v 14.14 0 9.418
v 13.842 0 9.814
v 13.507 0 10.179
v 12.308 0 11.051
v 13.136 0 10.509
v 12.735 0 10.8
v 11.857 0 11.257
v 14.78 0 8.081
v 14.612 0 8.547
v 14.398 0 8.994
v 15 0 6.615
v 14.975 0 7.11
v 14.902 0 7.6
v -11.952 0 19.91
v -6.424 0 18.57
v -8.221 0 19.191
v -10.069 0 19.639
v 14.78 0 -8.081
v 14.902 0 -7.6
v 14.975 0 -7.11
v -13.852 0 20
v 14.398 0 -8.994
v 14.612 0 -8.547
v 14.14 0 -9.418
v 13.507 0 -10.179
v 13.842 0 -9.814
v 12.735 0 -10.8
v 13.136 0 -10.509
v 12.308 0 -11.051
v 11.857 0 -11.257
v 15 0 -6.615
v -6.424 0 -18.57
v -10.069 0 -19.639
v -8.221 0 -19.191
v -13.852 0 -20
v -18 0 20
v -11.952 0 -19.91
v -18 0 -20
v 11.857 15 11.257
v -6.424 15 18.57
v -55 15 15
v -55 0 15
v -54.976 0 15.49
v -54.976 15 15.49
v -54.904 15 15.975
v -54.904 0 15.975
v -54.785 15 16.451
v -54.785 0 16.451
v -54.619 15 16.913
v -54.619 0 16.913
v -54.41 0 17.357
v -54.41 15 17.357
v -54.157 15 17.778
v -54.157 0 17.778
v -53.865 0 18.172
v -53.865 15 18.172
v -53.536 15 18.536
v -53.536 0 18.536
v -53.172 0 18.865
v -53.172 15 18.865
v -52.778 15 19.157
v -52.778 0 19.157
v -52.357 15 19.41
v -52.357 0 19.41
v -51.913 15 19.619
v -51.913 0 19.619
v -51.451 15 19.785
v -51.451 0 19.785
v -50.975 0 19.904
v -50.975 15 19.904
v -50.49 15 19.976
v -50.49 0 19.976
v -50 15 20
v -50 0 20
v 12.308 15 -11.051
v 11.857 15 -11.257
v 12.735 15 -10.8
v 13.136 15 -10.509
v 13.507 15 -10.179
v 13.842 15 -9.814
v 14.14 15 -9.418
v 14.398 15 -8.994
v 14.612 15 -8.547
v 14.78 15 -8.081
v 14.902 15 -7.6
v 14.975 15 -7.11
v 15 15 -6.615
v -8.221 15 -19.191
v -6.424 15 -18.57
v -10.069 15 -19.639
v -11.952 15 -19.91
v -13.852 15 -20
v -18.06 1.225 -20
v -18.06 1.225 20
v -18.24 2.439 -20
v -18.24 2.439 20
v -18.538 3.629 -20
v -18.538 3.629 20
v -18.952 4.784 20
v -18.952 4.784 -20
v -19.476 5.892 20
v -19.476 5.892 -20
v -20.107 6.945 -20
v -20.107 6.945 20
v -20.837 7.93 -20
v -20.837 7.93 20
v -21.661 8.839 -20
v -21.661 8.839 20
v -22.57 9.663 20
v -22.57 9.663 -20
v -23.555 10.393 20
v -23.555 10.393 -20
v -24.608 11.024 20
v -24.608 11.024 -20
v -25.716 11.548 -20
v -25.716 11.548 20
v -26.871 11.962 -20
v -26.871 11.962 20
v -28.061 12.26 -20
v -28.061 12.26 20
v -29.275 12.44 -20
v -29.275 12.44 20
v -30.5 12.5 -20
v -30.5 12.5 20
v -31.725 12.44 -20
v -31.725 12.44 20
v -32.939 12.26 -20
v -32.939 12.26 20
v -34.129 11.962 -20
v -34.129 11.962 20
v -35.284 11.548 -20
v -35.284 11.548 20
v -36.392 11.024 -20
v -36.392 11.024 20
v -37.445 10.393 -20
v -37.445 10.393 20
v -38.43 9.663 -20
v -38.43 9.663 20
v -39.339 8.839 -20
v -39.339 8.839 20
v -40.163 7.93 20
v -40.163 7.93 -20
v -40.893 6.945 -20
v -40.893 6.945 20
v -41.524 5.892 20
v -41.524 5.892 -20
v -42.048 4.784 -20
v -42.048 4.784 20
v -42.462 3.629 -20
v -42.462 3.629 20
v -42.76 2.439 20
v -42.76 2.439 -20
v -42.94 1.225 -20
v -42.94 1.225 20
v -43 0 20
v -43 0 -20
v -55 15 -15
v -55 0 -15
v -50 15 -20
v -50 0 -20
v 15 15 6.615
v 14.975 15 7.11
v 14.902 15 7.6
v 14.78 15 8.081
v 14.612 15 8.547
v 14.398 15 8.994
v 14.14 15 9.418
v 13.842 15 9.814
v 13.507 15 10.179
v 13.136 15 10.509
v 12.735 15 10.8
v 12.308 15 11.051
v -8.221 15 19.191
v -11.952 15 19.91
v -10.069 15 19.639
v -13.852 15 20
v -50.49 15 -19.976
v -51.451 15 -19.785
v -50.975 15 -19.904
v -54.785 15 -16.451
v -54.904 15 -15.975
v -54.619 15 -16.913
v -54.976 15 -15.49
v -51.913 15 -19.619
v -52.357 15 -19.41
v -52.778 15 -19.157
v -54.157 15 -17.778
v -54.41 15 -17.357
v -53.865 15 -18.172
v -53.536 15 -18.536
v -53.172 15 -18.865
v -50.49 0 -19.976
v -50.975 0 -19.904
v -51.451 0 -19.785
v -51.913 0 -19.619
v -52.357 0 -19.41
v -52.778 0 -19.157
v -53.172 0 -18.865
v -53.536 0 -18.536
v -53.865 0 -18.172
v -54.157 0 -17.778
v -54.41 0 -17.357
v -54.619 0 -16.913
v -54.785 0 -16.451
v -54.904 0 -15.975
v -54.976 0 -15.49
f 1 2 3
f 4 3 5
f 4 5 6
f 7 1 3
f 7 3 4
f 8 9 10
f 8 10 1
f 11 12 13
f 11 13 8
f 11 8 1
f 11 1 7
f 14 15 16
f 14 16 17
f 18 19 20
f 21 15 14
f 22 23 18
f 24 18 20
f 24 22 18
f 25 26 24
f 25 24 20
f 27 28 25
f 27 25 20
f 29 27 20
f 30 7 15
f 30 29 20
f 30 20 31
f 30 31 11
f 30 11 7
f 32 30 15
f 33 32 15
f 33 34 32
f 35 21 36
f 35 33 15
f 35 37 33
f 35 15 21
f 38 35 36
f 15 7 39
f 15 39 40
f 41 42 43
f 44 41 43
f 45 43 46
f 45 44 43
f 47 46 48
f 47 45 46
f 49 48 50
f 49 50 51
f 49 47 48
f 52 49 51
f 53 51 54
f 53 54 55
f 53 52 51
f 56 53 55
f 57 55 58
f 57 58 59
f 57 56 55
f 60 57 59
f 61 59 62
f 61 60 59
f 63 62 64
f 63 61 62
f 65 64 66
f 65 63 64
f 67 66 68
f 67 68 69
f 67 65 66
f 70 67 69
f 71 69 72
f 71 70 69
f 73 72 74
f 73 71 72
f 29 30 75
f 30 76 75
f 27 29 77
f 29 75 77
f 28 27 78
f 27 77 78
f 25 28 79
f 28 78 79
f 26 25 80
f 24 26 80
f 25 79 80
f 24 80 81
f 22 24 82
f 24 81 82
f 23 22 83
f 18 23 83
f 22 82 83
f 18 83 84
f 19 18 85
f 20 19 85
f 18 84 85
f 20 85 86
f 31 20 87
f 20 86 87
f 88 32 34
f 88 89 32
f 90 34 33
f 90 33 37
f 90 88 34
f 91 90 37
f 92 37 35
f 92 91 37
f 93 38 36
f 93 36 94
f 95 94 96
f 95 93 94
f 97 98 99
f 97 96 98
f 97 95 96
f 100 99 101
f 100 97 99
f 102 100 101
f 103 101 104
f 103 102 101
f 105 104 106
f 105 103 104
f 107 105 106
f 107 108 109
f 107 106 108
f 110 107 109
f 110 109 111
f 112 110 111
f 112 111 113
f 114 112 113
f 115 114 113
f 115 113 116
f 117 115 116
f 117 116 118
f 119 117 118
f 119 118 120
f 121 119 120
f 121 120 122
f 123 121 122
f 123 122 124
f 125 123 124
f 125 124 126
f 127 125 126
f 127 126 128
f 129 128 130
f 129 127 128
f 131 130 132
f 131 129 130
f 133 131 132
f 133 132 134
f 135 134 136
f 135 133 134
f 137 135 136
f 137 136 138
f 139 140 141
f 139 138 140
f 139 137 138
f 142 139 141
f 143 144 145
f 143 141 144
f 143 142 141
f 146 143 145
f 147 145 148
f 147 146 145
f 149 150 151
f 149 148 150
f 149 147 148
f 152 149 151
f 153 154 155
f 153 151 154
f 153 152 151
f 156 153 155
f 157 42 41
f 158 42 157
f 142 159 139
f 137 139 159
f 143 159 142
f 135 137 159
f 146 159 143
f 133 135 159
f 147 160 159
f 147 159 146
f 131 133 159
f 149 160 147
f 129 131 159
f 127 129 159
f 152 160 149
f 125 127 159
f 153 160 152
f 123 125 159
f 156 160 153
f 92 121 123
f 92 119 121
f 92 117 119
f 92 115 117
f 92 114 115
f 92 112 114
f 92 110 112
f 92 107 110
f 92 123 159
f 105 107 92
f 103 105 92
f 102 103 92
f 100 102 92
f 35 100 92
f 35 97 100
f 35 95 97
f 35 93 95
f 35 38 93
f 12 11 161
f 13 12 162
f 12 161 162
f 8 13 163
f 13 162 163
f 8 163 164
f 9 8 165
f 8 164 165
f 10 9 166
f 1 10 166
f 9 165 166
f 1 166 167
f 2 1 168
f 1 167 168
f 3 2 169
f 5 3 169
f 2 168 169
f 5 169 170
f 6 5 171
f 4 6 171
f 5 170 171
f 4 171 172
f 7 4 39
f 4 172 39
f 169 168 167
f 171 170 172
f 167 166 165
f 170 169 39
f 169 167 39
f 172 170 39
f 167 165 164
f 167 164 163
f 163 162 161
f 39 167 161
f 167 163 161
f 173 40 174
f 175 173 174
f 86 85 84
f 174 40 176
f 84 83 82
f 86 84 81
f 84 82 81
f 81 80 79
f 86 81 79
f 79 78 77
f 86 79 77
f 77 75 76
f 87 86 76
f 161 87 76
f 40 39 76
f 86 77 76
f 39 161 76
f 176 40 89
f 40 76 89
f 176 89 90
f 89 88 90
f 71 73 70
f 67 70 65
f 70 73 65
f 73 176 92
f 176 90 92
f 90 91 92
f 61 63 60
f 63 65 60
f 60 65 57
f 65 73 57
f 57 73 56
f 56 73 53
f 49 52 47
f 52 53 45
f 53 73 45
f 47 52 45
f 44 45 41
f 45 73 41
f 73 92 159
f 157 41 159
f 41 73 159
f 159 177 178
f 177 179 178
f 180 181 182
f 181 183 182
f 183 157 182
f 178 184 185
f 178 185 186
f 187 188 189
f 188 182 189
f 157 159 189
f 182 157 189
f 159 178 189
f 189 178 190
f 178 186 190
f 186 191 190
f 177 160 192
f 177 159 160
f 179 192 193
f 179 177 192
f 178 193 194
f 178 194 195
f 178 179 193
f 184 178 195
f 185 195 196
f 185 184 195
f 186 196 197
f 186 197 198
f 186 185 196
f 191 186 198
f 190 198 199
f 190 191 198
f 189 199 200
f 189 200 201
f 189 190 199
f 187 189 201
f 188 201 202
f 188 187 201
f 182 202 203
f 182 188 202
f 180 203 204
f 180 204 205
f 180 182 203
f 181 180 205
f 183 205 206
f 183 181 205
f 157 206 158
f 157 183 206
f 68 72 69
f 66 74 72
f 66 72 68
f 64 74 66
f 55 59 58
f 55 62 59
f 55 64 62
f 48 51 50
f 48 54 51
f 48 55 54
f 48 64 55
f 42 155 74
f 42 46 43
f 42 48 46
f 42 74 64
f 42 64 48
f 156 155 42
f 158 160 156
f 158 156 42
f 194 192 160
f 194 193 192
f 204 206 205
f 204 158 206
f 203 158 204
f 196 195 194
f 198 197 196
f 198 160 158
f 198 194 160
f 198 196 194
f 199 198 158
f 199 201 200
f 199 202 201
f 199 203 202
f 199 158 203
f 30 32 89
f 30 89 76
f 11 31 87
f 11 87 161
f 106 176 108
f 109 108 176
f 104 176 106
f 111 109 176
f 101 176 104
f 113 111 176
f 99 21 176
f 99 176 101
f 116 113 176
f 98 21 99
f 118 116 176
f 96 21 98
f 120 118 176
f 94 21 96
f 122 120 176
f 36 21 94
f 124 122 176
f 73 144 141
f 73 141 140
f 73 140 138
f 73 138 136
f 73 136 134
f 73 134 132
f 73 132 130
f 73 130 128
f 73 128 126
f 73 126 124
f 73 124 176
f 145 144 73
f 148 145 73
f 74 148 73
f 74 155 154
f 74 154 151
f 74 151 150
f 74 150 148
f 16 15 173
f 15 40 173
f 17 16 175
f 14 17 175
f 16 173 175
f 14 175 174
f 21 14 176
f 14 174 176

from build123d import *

# Parameters (mm, degrees)
BOSS_EXTRUDE1_DEPTH     = 15
CUT_EXTRUDE1_DEPTH      = 61.415229868
CUT_EXTRUDE1_DEPTH_BACK = 61.415229868
SKETCH2_R               = 12.5
FILLET2_R               = 5
FILLET3_R               = 20


with BuildPart() as part:
    # Sketch1 → Boss-Extrude1 (new body)
    with BuildSketch(Plane(origin=(0, 0, 0), x_dir=(1, 0, 0), z_dir=(0, 1, 0))):
        Polygon((-10, 20), (15, 10), (15, -10), (-10, -20), (-55, -20), (-55, 20), align=None)
    extrude(amount=BOSS_EXTRUDE1_DEPTH)

    # Sketch2 → Cut-Extrude1 (cut, two sides: drawn at the far end of the back side and taken through both)
    with BuildSketch(Plane.XY.offset(-CUT_EXTRUDE1_DEPTH_BACK)):
        with Locations((-30.5, 0)):
            Circle(SKETCH2_R)
    extrude(amount=CUT_EXTRUDE1_DEPTH + CUT_EXTRUDE1_DEPTH_BACK, mode=Mode.SUBTRACT)

    # Fillet2
    fillet2_edges = [part.edges().sort_by_distance(p)[0] for p in [
        (-55, 7.5, 20),
        (-55, 7.5, -20),
        (15, 7.5, -10),
        (15, 7.5, 10),
    ]]
    fillet(fillet2_edges, radius=FILLET2_R)

    # Fillet3
    fillet3_edges = [part.edges().sort_by_distance(p)[0] for p in [
        (-10, 7.5, 20),
        (-10, 7.5, -20),
    ]]
    fillet(fillet3_edges, radius=FILLET3_R)


solid = part.part
